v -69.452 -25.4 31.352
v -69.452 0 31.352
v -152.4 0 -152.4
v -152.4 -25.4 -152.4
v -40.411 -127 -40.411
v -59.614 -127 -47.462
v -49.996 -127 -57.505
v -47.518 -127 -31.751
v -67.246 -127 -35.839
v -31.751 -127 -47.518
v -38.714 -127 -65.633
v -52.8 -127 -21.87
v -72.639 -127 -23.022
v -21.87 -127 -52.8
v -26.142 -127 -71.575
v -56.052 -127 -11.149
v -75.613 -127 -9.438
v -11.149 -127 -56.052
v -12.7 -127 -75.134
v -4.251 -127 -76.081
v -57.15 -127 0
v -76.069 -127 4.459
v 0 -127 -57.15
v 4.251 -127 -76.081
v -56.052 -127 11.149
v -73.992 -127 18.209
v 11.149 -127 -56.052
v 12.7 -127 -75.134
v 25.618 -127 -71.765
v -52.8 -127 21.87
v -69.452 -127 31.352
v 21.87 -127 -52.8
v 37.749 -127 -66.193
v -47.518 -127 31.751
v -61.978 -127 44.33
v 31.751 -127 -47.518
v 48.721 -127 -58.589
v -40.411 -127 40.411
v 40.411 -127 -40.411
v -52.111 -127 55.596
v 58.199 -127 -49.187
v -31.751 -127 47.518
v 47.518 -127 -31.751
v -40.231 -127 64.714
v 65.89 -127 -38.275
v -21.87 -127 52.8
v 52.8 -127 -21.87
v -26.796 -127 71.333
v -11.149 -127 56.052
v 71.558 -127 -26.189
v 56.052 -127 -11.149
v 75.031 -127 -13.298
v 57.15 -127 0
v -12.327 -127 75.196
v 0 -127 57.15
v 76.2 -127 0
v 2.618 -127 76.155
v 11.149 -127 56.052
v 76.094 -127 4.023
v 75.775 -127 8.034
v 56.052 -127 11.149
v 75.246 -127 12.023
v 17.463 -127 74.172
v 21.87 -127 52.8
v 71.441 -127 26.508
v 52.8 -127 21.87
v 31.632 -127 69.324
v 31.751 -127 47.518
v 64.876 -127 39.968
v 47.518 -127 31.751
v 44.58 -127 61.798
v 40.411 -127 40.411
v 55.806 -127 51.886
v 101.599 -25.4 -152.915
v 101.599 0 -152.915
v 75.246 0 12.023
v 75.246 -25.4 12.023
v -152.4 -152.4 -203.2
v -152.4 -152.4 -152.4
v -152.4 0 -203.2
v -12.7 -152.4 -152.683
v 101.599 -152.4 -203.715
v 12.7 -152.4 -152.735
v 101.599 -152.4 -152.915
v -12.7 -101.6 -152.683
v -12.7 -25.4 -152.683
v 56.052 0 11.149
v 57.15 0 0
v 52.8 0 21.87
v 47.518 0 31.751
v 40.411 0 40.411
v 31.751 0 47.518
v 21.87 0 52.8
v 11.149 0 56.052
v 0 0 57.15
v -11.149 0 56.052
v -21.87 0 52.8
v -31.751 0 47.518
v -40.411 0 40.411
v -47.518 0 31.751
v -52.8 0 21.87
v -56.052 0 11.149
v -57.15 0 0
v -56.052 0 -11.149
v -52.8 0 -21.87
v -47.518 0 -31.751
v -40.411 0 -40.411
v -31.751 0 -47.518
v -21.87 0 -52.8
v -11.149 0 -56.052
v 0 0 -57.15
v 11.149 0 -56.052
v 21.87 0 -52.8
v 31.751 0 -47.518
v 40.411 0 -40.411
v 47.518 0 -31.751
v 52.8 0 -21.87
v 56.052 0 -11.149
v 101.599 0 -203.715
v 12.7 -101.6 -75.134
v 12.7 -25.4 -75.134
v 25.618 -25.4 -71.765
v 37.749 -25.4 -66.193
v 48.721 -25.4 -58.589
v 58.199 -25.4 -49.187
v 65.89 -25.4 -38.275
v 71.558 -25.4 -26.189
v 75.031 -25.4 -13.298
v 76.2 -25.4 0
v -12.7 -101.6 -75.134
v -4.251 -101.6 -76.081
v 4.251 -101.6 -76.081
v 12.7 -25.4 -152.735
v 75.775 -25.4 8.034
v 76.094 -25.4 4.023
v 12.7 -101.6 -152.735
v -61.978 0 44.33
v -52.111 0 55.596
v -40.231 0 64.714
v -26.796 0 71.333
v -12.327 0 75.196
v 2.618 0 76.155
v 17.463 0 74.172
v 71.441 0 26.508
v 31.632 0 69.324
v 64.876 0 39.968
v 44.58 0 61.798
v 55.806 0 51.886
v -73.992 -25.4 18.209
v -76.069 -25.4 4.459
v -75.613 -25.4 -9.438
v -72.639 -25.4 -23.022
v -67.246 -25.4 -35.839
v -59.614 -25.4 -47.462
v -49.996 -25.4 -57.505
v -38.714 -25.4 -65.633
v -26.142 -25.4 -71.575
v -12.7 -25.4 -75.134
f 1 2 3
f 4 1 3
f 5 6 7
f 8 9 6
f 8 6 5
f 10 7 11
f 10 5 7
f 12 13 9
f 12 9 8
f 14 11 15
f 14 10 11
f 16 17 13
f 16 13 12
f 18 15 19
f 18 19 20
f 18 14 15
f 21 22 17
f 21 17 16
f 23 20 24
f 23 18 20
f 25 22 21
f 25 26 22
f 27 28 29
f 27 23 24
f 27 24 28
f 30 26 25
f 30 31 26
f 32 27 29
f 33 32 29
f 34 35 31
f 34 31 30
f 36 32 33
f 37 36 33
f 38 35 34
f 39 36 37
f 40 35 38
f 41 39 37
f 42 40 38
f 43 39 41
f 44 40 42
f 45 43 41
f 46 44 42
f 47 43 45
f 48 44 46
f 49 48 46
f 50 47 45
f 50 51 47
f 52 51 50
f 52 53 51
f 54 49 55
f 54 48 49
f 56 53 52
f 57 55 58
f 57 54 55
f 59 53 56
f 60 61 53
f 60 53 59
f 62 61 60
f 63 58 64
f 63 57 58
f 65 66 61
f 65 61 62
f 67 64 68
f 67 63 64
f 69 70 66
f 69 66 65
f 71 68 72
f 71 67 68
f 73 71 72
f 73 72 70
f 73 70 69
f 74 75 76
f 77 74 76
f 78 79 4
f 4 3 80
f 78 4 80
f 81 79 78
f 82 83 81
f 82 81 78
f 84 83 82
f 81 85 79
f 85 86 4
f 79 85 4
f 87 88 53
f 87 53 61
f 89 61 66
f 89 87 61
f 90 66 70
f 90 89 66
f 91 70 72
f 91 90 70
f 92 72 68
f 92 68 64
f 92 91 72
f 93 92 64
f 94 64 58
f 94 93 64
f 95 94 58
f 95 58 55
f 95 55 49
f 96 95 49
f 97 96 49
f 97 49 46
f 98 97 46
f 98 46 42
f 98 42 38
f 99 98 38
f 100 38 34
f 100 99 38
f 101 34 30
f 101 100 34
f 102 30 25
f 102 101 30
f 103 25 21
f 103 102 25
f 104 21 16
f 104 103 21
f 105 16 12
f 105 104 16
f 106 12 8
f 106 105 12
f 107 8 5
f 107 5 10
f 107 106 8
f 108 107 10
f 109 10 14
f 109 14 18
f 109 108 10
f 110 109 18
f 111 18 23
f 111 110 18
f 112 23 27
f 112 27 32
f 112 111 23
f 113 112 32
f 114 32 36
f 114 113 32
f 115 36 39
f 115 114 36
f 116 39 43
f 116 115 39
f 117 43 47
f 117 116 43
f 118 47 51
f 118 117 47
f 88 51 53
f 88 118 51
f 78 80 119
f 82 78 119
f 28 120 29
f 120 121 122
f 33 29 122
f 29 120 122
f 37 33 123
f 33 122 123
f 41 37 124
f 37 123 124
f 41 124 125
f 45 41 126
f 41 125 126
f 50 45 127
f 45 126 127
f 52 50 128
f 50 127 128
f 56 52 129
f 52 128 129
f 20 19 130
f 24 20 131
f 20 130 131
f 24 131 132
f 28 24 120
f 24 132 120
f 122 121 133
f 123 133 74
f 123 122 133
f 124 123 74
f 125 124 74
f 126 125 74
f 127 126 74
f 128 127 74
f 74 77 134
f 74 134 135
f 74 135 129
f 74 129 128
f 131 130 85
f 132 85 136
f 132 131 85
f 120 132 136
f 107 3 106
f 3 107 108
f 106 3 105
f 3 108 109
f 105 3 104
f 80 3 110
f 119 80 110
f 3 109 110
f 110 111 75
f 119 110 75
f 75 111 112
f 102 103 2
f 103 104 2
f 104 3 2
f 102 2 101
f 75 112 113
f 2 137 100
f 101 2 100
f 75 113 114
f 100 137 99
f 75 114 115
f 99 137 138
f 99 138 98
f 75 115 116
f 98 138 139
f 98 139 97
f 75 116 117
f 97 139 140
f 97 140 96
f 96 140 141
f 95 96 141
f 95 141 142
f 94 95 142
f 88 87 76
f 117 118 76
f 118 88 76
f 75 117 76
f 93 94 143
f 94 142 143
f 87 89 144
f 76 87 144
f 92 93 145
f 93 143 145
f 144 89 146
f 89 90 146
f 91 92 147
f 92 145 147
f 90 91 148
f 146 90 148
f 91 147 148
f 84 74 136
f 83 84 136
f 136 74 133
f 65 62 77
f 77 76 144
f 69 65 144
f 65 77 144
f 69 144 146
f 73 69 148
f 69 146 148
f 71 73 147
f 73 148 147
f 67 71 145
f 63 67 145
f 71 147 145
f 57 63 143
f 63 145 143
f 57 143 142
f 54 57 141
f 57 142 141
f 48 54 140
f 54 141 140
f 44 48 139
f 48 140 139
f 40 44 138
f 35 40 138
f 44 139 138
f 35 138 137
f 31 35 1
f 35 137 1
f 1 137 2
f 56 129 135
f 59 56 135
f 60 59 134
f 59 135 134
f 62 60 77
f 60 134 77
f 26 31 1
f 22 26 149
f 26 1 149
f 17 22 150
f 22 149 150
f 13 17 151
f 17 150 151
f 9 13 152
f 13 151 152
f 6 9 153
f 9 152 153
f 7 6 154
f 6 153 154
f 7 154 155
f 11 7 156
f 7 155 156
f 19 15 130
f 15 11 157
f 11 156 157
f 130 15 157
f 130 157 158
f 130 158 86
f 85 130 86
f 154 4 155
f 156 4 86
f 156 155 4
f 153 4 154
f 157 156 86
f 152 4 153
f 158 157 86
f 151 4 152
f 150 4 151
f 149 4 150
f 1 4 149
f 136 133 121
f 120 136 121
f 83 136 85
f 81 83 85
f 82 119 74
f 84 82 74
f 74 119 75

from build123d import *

# Parameters (mm, degrees)
F1_DEPTH = 152.4
F2_DEPTH = 25.4
F3_DEPTH = 101.6
F0_R     = 57.15
F4_DEPTH = 127


with BuildPart() as f1:
    # F0 (on Front) → F1 (new body)
    with BuildSketch(Plane.XZ):
        Polygon((101.599478, -203.715121), (101.599478, -152.915121), (12.7, -152.73483), (-12.7, -152.683317), (-152.4, -152.4), (-152.4, -203.2), align=None)
    extrude(amount=F1_DEPTH)

    # F0 (on Front) → F2 (join)
    with BuildSketch(Plane.XZ):
        with BuildLine():
            ThreePointArc((75.245546, 12.022802), (75.961012, 6.030314), (76.2, 0))
            ThreePointArc((76.2, 0), (58.198711, -49.186888), (12.7, -75.134213))
            Line((12.7, -75.134213), (12.7, -152.73483))
            Line((12.7, -152.73483), (101.599478, -152.915121))
            Line((101.599478, -152.915121), (75.245546, 12.022802))
        make_face()
        with BuildLine():
            ThreePointArc((-12.7, -75.134213), (-67.246003, -35.838737), (-69.451562, 31.351562))
            Line((-69.451562, 31.351562), (-152.4, -152.4))
            Line((-152.4, -152.4), (-12.7, -152.683317))
            Line((-12.7, -152.683317), (-12.7, -152.4))
            Line((-12.7, -152.4), (-12.7, -75.134213))
        make_face()
    extrude(amount=F2_DEPTH)

    # F0 (on Front) → F3 (join)
    with BuildSketch(Plane.XZ):
        with BuildLine():
            Line((12.7, -152.73483), (12.7, -75.134213))
            ThreePointArc((12.7, -75.134213), (0, -76.2), (-12.7, -75.134213))
            Line((-12.7, -75.134213), (-12.7, -152.4))
            Line((-12.7, -152.4), (-12.7, -152.683317))
            Line((-12.7, -152.683317), (12.7, -152.73483))
        make_face()
    extrude(amount=F3_DEPTH)

    # F0 (on Front) → F4 (join)
    with BuildSketch(Plane.XZ):
        with BuildLine():
            ThreePointArc((12.7, -75.134213), (58.198711, -49.186888), (76.2, 0))
            ThreePointArc((76.2, 0), (75.961012, 6.030314), (75.245546, 12.022802))
            ThreePointArc((75.245546, 12.022802), (10.089242, 75.529115), (-69.451562, 31.351562))
            ThreePointArc((-69.451562, 31.351562), (-67.246003, -35.838737), (-12.7, -75.134213))
            ThreePointArc((-12.7, -75.134213), (0, -76.2), (12.7, -75.134213))
        make_face()
        Circle(F0_R, mode=Mode.SUBTRACT)
    extrude(amount=F4_DEPTH)


solid = f1.part
